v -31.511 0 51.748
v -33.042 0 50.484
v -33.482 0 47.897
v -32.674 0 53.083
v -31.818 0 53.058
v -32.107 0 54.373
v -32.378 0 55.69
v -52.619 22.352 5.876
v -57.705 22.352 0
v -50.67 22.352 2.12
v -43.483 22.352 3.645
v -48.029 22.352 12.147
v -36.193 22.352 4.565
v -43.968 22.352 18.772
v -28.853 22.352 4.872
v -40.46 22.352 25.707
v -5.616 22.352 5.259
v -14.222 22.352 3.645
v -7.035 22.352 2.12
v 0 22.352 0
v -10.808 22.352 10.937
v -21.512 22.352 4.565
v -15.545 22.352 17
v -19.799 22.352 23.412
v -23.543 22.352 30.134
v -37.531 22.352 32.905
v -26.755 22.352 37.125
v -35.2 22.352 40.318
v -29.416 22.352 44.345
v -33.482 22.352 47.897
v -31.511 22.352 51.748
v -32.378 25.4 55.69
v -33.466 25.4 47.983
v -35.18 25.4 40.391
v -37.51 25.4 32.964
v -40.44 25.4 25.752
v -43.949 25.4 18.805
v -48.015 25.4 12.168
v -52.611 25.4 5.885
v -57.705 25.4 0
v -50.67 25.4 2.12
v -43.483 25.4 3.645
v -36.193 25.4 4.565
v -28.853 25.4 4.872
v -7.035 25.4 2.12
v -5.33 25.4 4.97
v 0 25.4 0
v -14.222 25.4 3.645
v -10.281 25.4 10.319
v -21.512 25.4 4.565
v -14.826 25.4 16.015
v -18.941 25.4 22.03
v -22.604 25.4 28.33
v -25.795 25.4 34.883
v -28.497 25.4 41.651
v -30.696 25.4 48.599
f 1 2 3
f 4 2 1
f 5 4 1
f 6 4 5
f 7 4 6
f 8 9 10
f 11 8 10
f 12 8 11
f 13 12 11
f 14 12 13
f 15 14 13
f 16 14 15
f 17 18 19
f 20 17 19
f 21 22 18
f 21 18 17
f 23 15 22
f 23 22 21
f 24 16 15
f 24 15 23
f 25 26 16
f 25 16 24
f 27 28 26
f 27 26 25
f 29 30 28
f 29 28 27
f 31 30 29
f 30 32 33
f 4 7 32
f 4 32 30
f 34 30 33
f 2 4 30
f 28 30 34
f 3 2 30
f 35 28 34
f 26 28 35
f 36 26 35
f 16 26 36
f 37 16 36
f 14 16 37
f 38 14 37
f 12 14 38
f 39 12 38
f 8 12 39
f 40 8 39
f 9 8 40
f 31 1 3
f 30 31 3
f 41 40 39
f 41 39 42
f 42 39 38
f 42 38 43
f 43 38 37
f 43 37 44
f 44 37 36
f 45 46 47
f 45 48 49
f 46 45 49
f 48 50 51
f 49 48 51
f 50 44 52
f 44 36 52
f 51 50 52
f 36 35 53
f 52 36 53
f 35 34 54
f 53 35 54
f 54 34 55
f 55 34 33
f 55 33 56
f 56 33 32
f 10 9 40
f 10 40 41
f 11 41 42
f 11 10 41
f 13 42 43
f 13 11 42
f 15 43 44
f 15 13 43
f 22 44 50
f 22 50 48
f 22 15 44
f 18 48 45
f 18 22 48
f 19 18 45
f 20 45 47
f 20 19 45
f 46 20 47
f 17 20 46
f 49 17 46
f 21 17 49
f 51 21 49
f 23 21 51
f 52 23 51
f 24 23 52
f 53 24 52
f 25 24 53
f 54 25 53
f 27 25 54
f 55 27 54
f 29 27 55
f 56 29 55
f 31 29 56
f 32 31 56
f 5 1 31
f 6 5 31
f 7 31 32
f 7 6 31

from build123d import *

# Parameters (mm, degrees)
F1_DEPTH = 25.4
F3_DEPTH = 25.4
F4_DEPTH = 25.4
F5_DEPTH = 47.752


with BuildPart() as f1:
    # F0 (on Front) → F1 (new body)
    with BuildSketch(Plane.XZ):
        Polygon((-57.9928606749, 0), (0, 0), (-29.787896201, 55.1148019731), align=None)
    extrude(amount=F1_DEPTH)

    # F2 (on face) → F3 (join)
    with BuildSketch(Plane.XZ):
        with BuildLine():
            ThreePointArc((-32.3781482875, 55.6904152036), (-40.4396180835, 25.7523156056), (-57.7050559223, 0))
            ThreePointArc((-57.7050559223, 0), (-28.8525279611, 4.8719261638), (0, 0))
            ThreePointArc((0, 0), (-20.8306687823, 25.146606075), (-32.3781482875, 55.6904152036))
        make_face()
    extrude(amount=-F3_DEPTH)

    # F4 (cut): faces of the model
    f4_faces = [f1.faces().sort_by_distance(p)[0] for p in [
        (-44.4714868788, 0, 22.9050360722),
        (-28.8525279611, 0, 1.9534765457),
        (-18.405809999, 0, 28.5034341287),
        (-44.4714868788, 0, 22.9050360722),
        (-28.8525279611, 0, 1.9534765457),
        (-18.405809999, 0, 28.5034341287),
        (-28.8525279611, 0, 1.9534765457),
    ]]
    extrude(f4_faces, amount=-F4_DEPTH, mode=Mode.SUBTRACT)

    # F5 (cut): a face of the model
    f5_faces = [f1.faces().sort_by_distance(p)[0] for p in [
        (-30.2908637414, -25.4, 17.8560870297),
    ]]
    extrude(f5_faces, amount=-F5_DEPTH, mode=Mode.SUBTRACT)


solid = f1.part
